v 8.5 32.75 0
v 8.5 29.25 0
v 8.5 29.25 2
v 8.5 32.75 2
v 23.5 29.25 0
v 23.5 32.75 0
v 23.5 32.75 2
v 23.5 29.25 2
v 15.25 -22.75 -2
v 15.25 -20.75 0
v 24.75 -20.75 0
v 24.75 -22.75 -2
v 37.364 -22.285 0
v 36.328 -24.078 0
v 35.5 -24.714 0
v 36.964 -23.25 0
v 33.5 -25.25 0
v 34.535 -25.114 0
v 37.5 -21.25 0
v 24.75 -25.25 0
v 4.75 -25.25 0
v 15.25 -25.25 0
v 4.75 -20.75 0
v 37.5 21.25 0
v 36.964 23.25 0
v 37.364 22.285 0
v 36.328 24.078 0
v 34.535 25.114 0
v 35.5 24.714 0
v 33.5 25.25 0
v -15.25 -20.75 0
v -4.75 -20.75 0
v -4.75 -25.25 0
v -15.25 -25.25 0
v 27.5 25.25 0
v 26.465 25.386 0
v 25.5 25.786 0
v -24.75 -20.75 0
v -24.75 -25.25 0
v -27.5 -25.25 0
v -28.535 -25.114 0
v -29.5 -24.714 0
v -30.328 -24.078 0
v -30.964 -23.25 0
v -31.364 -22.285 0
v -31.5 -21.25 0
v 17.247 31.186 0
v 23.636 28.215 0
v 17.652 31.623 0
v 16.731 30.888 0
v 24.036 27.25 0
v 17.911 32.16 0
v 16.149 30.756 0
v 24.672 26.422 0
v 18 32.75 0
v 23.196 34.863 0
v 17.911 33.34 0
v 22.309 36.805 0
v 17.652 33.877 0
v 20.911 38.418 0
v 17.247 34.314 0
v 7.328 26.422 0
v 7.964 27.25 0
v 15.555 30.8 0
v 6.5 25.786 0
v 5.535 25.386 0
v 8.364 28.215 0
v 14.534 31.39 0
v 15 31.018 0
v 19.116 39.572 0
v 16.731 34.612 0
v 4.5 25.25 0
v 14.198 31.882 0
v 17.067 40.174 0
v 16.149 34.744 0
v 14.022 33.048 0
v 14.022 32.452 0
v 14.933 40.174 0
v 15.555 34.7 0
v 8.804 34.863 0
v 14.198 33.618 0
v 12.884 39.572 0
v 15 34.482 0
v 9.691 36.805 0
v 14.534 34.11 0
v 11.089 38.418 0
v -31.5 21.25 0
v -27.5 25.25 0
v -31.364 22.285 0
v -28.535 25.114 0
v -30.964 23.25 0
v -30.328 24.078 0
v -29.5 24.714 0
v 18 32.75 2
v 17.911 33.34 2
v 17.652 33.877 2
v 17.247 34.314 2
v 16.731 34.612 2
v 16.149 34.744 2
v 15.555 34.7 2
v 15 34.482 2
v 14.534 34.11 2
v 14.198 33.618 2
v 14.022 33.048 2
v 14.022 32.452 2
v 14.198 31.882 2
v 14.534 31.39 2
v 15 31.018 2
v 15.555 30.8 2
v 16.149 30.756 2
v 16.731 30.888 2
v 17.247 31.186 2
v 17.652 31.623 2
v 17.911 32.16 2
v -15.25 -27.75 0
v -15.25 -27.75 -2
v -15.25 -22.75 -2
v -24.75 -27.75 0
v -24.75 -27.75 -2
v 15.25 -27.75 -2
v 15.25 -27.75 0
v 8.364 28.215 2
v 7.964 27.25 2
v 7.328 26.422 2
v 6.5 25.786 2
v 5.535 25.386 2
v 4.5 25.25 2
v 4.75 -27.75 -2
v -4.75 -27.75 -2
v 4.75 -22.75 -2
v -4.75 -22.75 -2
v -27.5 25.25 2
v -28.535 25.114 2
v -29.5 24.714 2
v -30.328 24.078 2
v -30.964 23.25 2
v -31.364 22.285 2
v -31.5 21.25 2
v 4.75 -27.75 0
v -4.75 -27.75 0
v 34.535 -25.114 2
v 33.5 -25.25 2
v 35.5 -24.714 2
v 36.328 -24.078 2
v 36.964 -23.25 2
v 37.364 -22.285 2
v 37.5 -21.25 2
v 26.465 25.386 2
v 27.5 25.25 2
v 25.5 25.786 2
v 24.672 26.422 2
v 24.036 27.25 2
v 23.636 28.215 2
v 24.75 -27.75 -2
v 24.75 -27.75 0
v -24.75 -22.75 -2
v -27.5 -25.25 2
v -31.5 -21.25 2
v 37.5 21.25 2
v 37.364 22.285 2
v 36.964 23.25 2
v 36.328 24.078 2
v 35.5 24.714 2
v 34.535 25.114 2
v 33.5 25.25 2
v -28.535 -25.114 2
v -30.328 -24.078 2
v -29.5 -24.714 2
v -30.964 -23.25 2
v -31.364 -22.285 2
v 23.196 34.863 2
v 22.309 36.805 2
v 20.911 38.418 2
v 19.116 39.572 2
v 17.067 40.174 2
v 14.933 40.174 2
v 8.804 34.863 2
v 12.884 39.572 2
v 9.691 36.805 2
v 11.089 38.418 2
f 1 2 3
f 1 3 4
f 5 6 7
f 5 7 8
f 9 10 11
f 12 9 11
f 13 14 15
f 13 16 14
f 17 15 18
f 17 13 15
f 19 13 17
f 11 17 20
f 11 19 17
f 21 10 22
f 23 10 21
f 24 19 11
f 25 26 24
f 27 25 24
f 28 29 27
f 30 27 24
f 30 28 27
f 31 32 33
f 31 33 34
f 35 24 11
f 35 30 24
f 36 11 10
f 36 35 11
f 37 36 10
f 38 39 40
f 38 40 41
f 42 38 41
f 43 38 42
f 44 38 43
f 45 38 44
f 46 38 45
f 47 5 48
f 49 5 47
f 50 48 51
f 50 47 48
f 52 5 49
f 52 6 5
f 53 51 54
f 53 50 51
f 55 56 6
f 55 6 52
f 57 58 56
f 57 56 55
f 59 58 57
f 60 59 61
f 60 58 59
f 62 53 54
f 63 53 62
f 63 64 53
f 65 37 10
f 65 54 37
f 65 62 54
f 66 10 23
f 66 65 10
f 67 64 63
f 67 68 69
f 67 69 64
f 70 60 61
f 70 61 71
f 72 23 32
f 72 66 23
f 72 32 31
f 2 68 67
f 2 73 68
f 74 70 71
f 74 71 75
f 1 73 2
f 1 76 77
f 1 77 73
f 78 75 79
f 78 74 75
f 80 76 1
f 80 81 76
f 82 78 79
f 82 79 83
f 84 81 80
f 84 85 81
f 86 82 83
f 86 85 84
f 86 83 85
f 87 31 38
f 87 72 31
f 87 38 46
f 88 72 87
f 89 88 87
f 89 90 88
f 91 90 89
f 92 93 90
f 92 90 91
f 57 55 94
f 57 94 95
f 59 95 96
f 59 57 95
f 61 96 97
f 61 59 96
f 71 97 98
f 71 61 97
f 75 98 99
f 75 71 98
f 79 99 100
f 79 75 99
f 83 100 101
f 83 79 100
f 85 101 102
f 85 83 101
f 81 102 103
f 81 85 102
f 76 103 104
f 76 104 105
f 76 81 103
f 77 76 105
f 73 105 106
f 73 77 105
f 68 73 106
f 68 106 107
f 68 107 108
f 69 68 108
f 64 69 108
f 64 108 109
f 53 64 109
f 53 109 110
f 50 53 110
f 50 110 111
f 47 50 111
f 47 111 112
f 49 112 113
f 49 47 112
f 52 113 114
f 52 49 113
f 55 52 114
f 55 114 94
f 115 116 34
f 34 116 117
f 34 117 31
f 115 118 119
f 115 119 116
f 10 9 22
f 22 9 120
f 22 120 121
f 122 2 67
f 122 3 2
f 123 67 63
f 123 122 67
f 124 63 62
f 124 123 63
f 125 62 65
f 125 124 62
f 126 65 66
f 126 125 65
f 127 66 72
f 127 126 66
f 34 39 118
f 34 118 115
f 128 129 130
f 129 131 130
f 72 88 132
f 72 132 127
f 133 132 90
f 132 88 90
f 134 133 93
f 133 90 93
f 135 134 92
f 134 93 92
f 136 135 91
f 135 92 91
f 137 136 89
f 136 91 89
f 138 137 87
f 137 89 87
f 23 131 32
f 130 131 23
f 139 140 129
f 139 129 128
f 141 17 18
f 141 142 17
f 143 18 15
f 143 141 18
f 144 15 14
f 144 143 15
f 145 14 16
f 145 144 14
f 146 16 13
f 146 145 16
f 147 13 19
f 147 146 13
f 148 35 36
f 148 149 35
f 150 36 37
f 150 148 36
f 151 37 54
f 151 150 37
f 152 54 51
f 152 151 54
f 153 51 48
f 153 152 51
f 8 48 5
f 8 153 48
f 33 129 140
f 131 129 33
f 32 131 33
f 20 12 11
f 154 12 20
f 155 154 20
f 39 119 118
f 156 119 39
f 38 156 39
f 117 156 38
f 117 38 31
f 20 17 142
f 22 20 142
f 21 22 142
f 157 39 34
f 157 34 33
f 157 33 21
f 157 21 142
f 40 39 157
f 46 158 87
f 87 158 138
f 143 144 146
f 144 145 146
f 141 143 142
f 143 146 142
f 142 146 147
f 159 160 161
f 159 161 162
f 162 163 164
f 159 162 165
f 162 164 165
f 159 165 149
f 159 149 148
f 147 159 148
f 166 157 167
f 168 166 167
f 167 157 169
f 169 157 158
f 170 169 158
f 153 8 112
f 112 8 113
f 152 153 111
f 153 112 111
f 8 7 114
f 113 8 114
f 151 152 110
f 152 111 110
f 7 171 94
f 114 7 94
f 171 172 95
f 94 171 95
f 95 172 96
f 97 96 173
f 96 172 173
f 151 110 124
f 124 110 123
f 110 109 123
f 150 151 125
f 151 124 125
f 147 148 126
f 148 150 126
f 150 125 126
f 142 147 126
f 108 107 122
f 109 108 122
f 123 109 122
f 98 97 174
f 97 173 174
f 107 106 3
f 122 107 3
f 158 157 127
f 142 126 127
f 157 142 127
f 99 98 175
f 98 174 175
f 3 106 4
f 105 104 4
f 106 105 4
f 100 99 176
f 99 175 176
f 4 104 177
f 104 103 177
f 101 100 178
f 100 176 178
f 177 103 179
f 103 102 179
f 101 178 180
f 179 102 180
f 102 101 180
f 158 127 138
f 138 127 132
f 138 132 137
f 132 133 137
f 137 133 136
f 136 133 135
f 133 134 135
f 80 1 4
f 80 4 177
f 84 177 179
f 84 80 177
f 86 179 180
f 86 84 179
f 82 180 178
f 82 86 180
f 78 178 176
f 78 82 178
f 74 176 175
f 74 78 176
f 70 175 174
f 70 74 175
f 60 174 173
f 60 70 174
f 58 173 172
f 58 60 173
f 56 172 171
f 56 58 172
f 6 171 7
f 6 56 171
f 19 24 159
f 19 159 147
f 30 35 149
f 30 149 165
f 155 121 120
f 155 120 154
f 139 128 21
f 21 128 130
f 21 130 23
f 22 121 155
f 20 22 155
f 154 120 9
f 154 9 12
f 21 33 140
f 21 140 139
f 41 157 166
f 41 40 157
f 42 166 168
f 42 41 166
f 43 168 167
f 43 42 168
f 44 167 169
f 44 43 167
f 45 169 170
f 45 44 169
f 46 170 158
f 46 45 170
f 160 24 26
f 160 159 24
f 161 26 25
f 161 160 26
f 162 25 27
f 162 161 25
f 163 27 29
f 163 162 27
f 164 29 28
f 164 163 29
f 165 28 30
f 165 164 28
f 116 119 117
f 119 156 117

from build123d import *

# Parameters (mm, degrees)
ESQUISSE1_R             = 2
BOSS_EXTRU_1_DEPTH      = 2
ESQUISSE2_W             = 9.5
ESQUISSE2_H             = 2
BOSS_EXTRU_2_DEPTH      = 2.5
CHANFREIN1_SIZE         = 2
ENL_V_MAT_EXTRU_2_REACH = 57.157
ESQUISSE4_W             = 6
ESQUISSE4_H             = 50.5
CONG_1_R                = 4


with BuildPart() as part:
    # Esquisse1 → Boss.-Extru.1 (new body)
    with BuildSketch(Plane.XY):
        with BuildLine():
            ThreePointArc((8.5, 32.75), (16, 40.25), (23.5, 32.75))
            Line((23.5, 32.75), (23.5, 25.25))
            Line((23.5, 25.25), (37.5, 25.25))
            Line((37.5, 25.25), (37.5, -25.25))
            Line((37.5, -25.25), (-37.5, -25.25))
            Line((-37.5, -25.25), (-37.5, 25.25))
            Line((-37.5, 25.25), (8.5, 25.25))
            Line((8.5, 25.25), (8.5, 32.75))
        make_face()
        with Locations((16, 32.75)):
            Circle(ESQUISSE1_R, mode=Mode.SUBTRACT)
    extrude(amount=BOSS_EXTRU_1_DEPTH)

    # Esquisse2 → Boss.-Extru.2 (add, symmetric)
    with BuildSketch(Plane.XZ.offset(25.25)):
        with Locations((0, -1)):
            Rectangle(ESQUISSE2_W, ESQUISSE2_H)
        with Locations((-20, -1)):
            Rectangle(ESQUISSE2_W, ESQUISSE2_H)
        with Locations((20, -1)):
            Rectangle(ESQUISSE2_W, ESQUISSE2_H)
    extrude(amount=BOSS_EXTRU_2_DEPTH, both=True)

    # Chanfrein1
    chanfrein1_edges = [part.edges().sort_by_distance(p)[0] for p in [
        (-20, -22.75, 0),
        (0, -22.75, 0),
        (20, -22.75, 0),
    ]]
    chamfer(chanfrein1_edges, length=CHANFREIN1_SIZE - 0.0001)  # a hair under: the kernel refuses the full size

    # Esquisse4 → Enlèv. mat.-Extru.2 (cut, up to next)
    with BuildSketch(Plane.XY.offset(2), mode=Mode.PRIVATE) as enl_v_mat_extru_2_sk1:
        with Locations((-34.5, 0)):
            Rectangle(ESQUISSE4_W, ESQUISSE4_H)
    enl_v_mat_extru_2_tool1 = extrude(enl_v_mat_extru_2_sk1.sketch, amount=-ENL_V_MAT_EXTRU_2_REACH, mode=Mode.PRIVATE) & part.part
    add(enl_v_mat_extru_2_tool1.solids().sort_by_distance((-34.5, 0, 2))[0], mode=Mode.SUBTRACT)

    # Congé1
    cong_1_edges = [part.edges().sort_by_distance(p)[0] for p in [
        (-31.5, 25.25, 1),
        (-31.5, -25.25, 1),
        (23.5, 25.25, 1),
        (37.5, 25.25, 1),
        (37.5, -25.25, 1),
        (8.5, 25.25, 1),
    ]]
    fillet(cong_1_edges, radius=CONG_1_R)


solid = part.part
